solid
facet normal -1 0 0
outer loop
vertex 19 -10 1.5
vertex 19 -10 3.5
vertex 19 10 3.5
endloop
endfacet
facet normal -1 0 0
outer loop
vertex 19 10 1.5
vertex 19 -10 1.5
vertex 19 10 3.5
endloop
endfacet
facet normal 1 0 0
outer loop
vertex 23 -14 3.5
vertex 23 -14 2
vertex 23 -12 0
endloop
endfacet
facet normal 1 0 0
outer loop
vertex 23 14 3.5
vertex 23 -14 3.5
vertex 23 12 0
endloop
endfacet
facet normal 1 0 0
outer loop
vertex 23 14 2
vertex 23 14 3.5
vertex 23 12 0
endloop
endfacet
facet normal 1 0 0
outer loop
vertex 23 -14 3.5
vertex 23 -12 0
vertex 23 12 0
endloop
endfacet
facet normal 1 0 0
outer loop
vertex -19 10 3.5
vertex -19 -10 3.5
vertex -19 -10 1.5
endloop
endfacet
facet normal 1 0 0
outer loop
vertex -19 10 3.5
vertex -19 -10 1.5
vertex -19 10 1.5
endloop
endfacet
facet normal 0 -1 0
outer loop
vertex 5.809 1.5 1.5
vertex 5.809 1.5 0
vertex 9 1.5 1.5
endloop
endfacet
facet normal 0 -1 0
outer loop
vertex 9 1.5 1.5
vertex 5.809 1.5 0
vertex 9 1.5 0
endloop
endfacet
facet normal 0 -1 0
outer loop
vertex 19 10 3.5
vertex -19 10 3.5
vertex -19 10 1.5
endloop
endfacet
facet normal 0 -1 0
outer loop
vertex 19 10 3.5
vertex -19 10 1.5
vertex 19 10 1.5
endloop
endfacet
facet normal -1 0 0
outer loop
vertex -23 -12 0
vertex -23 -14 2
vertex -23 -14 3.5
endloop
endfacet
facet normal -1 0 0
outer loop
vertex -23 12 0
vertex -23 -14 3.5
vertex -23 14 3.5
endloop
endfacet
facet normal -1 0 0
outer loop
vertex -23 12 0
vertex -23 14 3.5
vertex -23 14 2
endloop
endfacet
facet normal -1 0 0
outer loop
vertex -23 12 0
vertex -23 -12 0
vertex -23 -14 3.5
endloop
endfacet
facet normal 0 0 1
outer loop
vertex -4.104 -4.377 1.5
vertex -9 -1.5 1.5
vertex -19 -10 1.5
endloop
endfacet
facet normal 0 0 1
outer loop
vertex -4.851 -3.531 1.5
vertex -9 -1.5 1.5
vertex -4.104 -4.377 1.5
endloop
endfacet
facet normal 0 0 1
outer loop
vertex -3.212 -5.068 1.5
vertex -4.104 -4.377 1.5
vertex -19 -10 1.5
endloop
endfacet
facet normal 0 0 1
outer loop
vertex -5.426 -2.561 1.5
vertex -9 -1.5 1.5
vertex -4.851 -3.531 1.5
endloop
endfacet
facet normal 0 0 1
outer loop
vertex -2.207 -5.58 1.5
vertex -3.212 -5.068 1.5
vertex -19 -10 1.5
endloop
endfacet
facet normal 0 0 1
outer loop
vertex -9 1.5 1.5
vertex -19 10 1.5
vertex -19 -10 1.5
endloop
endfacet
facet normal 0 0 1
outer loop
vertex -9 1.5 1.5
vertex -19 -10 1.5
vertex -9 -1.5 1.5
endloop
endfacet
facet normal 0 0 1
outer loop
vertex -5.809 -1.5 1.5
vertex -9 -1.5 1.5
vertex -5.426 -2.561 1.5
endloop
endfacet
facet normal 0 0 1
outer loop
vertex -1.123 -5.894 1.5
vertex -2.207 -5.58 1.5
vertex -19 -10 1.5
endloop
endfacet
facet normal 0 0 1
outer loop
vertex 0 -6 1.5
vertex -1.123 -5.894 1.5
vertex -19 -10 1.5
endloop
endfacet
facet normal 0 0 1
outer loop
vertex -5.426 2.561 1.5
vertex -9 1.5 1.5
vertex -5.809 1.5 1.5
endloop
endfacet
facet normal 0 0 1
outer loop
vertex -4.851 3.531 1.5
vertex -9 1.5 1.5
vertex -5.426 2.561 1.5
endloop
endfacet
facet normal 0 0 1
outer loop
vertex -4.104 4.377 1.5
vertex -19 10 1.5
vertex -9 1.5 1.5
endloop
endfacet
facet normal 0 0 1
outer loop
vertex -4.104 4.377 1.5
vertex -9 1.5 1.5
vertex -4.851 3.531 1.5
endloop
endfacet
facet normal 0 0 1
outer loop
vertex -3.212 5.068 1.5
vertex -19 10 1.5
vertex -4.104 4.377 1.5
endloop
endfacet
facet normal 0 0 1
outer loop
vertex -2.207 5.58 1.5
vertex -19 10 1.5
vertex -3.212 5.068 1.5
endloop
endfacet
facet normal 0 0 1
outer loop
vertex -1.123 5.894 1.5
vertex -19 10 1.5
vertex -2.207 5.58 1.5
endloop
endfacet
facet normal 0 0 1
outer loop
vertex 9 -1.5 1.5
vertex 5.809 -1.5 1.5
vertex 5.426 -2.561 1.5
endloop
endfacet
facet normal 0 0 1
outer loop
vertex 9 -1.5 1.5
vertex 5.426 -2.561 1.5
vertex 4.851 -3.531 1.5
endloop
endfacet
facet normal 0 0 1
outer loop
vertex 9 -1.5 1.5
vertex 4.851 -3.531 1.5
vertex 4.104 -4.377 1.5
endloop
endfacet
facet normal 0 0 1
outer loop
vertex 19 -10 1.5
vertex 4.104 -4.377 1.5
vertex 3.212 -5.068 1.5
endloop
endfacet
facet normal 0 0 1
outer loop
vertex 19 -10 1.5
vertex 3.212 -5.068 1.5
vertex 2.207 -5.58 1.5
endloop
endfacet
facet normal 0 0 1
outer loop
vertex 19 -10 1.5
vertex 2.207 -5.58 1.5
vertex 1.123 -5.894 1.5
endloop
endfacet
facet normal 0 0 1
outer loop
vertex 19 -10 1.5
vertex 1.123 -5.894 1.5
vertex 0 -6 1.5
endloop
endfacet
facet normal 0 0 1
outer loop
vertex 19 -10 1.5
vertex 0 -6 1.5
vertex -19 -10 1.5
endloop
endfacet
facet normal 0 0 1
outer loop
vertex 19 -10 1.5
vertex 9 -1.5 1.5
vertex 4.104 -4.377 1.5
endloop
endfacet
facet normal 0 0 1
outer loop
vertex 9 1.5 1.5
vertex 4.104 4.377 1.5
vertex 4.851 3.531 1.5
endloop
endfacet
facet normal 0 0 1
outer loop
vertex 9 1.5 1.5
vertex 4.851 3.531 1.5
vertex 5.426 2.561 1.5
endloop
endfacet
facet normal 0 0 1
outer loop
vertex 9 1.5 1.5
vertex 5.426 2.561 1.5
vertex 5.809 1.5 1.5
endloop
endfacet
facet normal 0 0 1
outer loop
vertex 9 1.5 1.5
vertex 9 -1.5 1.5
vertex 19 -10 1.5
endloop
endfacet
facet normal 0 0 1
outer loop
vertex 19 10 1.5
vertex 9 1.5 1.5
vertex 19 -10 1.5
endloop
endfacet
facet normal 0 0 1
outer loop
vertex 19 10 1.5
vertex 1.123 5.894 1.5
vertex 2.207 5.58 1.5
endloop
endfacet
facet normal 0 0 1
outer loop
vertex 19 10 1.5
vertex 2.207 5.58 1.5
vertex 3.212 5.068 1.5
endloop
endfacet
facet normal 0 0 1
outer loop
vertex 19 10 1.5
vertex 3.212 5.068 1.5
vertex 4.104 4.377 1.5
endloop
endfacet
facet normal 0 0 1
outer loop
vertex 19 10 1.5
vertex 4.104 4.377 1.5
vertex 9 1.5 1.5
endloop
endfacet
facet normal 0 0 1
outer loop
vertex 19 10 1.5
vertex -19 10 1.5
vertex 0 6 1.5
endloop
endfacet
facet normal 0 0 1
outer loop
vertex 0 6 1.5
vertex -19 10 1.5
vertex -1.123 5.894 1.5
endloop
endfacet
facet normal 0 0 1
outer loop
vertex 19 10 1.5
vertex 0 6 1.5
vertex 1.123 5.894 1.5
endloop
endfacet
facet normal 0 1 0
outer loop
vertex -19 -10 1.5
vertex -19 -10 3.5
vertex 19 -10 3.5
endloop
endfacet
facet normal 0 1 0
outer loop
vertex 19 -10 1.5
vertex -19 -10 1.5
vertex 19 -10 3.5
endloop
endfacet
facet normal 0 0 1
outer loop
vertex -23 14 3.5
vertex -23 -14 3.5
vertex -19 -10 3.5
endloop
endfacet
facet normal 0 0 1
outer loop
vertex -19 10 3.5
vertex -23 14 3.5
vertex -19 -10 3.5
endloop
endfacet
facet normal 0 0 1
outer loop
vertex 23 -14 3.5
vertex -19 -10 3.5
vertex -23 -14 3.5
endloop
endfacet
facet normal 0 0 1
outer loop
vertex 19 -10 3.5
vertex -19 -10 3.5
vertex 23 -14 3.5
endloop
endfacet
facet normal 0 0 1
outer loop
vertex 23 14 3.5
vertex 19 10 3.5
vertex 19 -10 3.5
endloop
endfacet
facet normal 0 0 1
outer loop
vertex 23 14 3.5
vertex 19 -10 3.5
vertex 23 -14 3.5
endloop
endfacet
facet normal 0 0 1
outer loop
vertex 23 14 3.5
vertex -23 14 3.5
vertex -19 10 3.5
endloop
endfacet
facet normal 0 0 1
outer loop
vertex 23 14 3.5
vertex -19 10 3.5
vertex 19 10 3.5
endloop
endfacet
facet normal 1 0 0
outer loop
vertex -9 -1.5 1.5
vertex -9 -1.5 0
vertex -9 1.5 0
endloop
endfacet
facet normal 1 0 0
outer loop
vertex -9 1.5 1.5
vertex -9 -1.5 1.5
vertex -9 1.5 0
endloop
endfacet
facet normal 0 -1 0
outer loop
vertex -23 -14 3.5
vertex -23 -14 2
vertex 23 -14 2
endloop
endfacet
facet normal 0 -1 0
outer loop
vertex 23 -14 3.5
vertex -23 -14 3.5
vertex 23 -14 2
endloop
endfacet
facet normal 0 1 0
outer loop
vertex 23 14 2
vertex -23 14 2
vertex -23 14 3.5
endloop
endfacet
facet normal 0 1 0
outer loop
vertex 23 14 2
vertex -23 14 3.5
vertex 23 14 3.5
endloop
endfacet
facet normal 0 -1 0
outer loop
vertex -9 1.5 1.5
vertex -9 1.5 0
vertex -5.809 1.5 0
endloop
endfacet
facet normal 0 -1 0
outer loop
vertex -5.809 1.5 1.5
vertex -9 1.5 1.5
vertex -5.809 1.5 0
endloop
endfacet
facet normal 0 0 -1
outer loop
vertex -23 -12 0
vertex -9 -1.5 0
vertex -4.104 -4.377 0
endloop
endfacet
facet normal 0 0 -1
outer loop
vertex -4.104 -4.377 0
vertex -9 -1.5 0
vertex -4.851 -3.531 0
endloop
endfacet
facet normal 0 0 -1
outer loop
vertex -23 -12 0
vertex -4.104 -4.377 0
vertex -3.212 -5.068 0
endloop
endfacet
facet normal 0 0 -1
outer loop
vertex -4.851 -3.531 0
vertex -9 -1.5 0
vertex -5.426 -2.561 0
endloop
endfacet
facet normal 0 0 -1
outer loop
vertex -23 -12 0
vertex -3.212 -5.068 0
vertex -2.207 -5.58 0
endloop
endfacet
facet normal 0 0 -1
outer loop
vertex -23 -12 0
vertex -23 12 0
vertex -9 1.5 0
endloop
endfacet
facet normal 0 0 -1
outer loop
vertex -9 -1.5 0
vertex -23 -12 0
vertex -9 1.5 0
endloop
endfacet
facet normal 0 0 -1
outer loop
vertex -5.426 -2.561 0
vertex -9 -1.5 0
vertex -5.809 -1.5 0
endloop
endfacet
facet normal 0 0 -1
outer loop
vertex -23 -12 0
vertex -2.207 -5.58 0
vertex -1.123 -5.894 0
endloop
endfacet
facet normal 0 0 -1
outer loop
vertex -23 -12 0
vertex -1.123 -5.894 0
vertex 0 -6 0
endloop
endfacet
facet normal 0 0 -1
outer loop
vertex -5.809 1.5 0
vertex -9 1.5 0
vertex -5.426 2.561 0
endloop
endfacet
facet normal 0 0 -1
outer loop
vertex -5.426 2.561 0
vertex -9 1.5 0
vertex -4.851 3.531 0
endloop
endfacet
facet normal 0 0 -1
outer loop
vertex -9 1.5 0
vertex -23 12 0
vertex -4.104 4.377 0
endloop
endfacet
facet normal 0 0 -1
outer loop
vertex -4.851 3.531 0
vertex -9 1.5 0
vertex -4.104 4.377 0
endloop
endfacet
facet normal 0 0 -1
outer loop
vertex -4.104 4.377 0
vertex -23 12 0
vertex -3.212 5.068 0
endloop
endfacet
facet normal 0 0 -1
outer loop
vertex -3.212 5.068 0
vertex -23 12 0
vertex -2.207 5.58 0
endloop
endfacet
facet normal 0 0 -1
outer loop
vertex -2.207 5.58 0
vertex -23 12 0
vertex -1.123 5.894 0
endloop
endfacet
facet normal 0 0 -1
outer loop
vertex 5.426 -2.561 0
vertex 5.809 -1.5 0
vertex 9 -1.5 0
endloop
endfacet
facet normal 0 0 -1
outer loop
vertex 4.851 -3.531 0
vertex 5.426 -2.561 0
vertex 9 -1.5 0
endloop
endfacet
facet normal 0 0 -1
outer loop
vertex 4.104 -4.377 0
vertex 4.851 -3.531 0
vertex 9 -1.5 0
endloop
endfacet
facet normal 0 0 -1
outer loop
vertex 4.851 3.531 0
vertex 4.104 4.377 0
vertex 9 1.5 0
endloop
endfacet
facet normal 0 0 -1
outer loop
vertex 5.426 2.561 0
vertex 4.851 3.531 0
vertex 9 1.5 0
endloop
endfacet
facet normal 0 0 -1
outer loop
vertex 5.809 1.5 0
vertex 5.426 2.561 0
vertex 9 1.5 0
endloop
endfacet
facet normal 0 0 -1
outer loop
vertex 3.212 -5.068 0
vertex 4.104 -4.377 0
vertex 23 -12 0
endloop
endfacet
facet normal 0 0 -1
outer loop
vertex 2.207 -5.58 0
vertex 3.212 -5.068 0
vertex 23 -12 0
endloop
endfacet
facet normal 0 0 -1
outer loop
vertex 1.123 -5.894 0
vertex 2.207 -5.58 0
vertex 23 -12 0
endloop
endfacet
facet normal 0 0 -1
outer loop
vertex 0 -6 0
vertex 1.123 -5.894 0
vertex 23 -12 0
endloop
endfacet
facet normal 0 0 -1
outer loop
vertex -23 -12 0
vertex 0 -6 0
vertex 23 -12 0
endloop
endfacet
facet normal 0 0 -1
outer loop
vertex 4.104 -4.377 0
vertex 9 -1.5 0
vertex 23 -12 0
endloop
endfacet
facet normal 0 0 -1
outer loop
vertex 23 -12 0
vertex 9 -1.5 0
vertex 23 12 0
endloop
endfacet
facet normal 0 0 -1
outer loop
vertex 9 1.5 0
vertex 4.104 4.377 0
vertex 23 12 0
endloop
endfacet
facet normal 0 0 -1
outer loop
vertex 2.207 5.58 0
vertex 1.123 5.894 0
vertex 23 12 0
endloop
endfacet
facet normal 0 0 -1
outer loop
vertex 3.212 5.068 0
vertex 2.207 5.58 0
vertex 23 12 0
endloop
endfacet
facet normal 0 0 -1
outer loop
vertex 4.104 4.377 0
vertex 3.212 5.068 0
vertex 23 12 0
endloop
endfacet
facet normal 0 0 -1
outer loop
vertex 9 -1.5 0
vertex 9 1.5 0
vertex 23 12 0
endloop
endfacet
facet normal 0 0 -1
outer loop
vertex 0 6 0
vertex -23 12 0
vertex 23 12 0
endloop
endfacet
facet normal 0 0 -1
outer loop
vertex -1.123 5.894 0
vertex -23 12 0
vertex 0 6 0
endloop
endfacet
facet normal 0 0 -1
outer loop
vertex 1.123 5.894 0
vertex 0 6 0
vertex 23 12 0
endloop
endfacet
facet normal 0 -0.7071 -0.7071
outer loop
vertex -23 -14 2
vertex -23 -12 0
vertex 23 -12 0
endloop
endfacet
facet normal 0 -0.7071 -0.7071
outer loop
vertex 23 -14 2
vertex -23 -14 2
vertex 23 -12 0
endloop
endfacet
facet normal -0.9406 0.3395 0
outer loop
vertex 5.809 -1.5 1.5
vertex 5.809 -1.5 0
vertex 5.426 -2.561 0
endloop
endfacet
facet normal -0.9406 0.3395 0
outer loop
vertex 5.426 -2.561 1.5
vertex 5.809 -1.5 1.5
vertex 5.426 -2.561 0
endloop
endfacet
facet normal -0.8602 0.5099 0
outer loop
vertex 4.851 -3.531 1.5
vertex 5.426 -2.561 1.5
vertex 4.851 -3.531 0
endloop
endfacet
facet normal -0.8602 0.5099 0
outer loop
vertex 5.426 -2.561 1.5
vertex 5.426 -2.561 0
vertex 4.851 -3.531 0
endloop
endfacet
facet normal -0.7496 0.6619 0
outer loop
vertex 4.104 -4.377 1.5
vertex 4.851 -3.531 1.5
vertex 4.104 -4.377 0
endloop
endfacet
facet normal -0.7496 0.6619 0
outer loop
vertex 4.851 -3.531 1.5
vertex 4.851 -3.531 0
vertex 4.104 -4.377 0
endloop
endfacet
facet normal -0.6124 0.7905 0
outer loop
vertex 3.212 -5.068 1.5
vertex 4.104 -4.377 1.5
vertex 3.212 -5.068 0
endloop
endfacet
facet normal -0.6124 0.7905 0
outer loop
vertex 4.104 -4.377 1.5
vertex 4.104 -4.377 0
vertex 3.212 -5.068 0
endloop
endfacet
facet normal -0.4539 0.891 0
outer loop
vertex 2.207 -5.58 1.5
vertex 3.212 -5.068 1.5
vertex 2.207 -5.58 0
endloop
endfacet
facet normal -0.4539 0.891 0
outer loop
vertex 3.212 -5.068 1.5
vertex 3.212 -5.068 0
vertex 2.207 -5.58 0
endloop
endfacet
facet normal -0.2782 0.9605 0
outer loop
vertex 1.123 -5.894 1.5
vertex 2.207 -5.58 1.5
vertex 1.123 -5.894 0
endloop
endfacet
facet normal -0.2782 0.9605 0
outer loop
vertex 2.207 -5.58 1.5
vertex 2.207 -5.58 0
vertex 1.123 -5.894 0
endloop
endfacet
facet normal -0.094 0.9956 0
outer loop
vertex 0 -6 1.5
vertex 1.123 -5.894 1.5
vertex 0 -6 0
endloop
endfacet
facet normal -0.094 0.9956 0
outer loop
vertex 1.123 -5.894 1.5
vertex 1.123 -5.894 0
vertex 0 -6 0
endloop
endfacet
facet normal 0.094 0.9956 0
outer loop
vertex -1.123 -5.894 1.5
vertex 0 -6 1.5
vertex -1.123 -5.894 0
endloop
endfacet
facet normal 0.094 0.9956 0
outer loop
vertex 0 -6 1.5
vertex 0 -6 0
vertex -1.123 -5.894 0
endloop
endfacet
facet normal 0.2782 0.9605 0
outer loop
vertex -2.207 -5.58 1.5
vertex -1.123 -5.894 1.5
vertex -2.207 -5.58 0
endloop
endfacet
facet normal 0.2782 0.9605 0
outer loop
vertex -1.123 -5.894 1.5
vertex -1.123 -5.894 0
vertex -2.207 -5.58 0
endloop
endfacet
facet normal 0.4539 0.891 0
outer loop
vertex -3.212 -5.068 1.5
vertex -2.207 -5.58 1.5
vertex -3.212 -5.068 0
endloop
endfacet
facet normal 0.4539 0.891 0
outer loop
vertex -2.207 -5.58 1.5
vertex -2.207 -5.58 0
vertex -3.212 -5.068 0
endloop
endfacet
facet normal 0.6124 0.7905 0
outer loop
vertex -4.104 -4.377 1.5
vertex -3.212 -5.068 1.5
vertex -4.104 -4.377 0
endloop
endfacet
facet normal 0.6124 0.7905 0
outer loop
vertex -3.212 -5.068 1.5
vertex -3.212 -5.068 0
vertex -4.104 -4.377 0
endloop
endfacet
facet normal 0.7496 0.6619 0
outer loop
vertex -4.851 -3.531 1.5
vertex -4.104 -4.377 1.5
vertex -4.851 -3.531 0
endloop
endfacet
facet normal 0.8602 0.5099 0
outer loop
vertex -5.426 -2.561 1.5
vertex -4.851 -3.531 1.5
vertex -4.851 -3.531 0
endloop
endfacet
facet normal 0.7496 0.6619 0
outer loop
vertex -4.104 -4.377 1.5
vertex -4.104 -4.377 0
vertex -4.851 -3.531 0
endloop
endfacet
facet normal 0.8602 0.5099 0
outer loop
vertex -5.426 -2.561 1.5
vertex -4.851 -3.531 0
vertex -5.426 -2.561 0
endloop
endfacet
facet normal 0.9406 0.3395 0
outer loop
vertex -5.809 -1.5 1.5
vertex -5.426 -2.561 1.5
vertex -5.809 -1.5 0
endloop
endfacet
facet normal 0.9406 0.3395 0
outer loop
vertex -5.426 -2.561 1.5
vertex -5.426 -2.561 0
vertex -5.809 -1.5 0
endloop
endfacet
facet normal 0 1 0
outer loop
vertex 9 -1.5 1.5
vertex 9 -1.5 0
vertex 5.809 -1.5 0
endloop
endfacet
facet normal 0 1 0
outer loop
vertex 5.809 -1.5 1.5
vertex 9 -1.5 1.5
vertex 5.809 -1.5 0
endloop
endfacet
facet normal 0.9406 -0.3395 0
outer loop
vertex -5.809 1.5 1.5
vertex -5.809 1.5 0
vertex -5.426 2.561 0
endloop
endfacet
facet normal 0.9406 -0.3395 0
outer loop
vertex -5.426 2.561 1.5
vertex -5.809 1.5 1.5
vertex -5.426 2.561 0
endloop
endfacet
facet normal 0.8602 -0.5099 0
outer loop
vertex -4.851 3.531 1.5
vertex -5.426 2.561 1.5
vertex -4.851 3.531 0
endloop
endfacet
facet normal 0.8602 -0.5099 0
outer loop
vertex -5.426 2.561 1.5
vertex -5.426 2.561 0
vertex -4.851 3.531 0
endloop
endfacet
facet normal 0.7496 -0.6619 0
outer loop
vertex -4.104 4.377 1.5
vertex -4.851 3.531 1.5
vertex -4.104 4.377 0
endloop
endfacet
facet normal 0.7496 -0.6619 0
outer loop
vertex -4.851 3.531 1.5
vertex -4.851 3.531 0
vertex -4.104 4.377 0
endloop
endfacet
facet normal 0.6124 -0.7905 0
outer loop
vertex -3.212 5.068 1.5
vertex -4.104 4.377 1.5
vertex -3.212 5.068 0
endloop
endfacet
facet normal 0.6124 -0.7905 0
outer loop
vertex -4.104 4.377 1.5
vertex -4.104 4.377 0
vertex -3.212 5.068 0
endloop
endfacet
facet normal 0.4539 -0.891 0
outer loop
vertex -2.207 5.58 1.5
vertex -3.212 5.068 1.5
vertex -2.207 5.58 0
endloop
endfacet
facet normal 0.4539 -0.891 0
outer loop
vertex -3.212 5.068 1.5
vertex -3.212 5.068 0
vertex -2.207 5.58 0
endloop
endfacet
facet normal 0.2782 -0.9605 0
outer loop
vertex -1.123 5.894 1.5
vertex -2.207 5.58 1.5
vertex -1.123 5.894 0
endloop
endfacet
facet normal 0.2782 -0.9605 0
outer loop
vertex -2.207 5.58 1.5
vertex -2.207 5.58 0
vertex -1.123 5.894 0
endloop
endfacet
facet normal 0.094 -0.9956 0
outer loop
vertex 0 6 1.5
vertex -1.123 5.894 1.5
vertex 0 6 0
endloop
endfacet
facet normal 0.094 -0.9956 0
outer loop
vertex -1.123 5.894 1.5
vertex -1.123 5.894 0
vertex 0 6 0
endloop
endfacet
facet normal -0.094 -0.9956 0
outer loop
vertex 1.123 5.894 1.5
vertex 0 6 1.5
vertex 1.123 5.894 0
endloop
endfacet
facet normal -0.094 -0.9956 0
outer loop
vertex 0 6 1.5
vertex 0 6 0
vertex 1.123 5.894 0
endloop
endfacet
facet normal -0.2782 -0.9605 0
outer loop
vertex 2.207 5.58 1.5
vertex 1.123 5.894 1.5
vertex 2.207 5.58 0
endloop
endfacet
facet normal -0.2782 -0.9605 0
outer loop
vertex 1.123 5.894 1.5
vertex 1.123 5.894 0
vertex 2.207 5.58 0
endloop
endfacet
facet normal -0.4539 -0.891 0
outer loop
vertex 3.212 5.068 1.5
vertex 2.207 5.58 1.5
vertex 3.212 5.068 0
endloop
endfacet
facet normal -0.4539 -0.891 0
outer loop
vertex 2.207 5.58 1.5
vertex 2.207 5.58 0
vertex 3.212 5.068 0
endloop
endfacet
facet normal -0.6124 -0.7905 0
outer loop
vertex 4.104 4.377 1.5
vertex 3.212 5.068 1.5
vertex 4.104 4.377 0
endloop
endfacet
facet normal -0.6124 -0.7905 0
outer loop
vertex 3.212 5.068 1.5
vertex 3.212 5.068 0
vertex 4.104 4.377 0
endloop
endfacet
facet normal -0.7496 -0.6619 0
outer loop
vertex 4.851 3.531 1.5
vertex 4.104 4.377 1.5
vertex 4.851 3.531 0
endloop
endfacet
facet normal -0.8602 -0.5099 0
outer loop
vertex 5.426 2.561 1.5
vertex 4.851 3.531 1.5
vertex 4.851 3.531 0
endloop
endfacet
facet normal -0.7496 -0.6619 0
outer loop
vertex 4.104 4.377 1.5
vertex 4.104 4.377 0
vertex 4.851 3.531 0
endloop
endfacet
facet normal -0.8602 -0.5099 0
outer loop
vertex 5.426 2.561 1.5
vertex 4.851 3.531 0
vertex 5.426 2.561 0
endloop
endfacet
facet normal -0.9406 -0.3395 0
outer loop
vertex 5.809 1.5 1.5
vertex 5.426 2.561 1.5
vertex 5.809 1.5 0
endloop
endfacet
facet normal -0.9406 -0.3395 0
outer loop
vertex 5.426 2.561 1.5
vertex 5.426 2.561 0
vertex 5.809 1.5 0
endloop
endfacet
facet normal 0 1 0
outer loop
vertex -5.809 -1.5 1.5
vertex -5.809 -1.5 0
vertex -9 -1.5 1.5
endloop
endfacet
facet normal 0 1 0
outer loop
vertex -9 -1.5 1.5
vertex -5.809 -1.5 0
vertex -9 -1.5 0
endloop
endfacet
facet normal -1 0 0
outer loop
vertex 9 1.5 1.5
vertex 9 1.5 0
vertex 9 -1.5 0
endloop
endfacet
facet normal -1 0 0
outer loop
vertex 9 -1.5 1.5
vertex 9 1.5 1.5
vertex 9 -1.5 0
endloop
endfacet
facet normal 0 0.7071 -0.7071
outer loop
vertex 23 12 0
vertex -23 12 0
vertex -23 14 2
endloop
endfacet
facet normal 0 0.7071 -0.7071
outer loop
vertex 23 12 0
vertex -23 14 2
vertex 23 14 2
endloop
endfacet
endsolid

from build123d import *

# Parameters (mm, degrees)
SKETCH_1_W          = 46
SKETCH_1_H          = 28
EXTRUDE_1_DEPTH     = 3.5
SKETCH_2_W          = 38
SKETCH_2_H          = 20
CUT_EXTRUDE_1_DEPTH = 2
CHAMFER_1_SIZE      = 2


with BuildPart() as part:
    # 草图1 → 凸台-拉伸1 (new body)
    with BuildSketch(Plane.XY):
        Rectangle(SKETCH_1_W, SKETCH_1_H)
        with BuildLine():
            Line((5.809475019, 1.5), (9, 1.5))
            Line((9, 1.5), (9, -1.5))
            Line((9, -1.5), (5.809475019, -1.5))
            ThreePointArc((5.809475019, -1.5), (0, -6), (-5.809475019, -1.5))
            Line((-5.809475019, -1.5), (-9, -1.5))
            Line((-9, -1.5), (-9, 1.5))
            Line((-9, 1.5), (-5.809475019, 1.5))
            ThreePointArc((-5.809475019, 1.5), (0, 6), (5.809475019, 1.5))
        make_face(mode=Mode.SUBTRACT)
    extrude(amount=EXTRUDE_1_DEPTH)

    # 草图2 → 切除-拉伸1 (cut)
    with BuildSketch(Plane.XY.offset(3.5)):
        Rectangle(SKETCH_2_W, SKETCH_2_H)
    extrude(amount=-CUT_EXTRUDE_1_DEPTH, mode=Mode.SUBTRACT)

    # 倒角1
    chamfer_1_edges = [part.edges().sort_by_distance(p)[0] for p in [
        (0, -14, 0),
        (0, 14, 0),
    ]]
    chamfer(chamfer_1_edges, length=CHAMFER_1_SIZE)


solid = part.part
